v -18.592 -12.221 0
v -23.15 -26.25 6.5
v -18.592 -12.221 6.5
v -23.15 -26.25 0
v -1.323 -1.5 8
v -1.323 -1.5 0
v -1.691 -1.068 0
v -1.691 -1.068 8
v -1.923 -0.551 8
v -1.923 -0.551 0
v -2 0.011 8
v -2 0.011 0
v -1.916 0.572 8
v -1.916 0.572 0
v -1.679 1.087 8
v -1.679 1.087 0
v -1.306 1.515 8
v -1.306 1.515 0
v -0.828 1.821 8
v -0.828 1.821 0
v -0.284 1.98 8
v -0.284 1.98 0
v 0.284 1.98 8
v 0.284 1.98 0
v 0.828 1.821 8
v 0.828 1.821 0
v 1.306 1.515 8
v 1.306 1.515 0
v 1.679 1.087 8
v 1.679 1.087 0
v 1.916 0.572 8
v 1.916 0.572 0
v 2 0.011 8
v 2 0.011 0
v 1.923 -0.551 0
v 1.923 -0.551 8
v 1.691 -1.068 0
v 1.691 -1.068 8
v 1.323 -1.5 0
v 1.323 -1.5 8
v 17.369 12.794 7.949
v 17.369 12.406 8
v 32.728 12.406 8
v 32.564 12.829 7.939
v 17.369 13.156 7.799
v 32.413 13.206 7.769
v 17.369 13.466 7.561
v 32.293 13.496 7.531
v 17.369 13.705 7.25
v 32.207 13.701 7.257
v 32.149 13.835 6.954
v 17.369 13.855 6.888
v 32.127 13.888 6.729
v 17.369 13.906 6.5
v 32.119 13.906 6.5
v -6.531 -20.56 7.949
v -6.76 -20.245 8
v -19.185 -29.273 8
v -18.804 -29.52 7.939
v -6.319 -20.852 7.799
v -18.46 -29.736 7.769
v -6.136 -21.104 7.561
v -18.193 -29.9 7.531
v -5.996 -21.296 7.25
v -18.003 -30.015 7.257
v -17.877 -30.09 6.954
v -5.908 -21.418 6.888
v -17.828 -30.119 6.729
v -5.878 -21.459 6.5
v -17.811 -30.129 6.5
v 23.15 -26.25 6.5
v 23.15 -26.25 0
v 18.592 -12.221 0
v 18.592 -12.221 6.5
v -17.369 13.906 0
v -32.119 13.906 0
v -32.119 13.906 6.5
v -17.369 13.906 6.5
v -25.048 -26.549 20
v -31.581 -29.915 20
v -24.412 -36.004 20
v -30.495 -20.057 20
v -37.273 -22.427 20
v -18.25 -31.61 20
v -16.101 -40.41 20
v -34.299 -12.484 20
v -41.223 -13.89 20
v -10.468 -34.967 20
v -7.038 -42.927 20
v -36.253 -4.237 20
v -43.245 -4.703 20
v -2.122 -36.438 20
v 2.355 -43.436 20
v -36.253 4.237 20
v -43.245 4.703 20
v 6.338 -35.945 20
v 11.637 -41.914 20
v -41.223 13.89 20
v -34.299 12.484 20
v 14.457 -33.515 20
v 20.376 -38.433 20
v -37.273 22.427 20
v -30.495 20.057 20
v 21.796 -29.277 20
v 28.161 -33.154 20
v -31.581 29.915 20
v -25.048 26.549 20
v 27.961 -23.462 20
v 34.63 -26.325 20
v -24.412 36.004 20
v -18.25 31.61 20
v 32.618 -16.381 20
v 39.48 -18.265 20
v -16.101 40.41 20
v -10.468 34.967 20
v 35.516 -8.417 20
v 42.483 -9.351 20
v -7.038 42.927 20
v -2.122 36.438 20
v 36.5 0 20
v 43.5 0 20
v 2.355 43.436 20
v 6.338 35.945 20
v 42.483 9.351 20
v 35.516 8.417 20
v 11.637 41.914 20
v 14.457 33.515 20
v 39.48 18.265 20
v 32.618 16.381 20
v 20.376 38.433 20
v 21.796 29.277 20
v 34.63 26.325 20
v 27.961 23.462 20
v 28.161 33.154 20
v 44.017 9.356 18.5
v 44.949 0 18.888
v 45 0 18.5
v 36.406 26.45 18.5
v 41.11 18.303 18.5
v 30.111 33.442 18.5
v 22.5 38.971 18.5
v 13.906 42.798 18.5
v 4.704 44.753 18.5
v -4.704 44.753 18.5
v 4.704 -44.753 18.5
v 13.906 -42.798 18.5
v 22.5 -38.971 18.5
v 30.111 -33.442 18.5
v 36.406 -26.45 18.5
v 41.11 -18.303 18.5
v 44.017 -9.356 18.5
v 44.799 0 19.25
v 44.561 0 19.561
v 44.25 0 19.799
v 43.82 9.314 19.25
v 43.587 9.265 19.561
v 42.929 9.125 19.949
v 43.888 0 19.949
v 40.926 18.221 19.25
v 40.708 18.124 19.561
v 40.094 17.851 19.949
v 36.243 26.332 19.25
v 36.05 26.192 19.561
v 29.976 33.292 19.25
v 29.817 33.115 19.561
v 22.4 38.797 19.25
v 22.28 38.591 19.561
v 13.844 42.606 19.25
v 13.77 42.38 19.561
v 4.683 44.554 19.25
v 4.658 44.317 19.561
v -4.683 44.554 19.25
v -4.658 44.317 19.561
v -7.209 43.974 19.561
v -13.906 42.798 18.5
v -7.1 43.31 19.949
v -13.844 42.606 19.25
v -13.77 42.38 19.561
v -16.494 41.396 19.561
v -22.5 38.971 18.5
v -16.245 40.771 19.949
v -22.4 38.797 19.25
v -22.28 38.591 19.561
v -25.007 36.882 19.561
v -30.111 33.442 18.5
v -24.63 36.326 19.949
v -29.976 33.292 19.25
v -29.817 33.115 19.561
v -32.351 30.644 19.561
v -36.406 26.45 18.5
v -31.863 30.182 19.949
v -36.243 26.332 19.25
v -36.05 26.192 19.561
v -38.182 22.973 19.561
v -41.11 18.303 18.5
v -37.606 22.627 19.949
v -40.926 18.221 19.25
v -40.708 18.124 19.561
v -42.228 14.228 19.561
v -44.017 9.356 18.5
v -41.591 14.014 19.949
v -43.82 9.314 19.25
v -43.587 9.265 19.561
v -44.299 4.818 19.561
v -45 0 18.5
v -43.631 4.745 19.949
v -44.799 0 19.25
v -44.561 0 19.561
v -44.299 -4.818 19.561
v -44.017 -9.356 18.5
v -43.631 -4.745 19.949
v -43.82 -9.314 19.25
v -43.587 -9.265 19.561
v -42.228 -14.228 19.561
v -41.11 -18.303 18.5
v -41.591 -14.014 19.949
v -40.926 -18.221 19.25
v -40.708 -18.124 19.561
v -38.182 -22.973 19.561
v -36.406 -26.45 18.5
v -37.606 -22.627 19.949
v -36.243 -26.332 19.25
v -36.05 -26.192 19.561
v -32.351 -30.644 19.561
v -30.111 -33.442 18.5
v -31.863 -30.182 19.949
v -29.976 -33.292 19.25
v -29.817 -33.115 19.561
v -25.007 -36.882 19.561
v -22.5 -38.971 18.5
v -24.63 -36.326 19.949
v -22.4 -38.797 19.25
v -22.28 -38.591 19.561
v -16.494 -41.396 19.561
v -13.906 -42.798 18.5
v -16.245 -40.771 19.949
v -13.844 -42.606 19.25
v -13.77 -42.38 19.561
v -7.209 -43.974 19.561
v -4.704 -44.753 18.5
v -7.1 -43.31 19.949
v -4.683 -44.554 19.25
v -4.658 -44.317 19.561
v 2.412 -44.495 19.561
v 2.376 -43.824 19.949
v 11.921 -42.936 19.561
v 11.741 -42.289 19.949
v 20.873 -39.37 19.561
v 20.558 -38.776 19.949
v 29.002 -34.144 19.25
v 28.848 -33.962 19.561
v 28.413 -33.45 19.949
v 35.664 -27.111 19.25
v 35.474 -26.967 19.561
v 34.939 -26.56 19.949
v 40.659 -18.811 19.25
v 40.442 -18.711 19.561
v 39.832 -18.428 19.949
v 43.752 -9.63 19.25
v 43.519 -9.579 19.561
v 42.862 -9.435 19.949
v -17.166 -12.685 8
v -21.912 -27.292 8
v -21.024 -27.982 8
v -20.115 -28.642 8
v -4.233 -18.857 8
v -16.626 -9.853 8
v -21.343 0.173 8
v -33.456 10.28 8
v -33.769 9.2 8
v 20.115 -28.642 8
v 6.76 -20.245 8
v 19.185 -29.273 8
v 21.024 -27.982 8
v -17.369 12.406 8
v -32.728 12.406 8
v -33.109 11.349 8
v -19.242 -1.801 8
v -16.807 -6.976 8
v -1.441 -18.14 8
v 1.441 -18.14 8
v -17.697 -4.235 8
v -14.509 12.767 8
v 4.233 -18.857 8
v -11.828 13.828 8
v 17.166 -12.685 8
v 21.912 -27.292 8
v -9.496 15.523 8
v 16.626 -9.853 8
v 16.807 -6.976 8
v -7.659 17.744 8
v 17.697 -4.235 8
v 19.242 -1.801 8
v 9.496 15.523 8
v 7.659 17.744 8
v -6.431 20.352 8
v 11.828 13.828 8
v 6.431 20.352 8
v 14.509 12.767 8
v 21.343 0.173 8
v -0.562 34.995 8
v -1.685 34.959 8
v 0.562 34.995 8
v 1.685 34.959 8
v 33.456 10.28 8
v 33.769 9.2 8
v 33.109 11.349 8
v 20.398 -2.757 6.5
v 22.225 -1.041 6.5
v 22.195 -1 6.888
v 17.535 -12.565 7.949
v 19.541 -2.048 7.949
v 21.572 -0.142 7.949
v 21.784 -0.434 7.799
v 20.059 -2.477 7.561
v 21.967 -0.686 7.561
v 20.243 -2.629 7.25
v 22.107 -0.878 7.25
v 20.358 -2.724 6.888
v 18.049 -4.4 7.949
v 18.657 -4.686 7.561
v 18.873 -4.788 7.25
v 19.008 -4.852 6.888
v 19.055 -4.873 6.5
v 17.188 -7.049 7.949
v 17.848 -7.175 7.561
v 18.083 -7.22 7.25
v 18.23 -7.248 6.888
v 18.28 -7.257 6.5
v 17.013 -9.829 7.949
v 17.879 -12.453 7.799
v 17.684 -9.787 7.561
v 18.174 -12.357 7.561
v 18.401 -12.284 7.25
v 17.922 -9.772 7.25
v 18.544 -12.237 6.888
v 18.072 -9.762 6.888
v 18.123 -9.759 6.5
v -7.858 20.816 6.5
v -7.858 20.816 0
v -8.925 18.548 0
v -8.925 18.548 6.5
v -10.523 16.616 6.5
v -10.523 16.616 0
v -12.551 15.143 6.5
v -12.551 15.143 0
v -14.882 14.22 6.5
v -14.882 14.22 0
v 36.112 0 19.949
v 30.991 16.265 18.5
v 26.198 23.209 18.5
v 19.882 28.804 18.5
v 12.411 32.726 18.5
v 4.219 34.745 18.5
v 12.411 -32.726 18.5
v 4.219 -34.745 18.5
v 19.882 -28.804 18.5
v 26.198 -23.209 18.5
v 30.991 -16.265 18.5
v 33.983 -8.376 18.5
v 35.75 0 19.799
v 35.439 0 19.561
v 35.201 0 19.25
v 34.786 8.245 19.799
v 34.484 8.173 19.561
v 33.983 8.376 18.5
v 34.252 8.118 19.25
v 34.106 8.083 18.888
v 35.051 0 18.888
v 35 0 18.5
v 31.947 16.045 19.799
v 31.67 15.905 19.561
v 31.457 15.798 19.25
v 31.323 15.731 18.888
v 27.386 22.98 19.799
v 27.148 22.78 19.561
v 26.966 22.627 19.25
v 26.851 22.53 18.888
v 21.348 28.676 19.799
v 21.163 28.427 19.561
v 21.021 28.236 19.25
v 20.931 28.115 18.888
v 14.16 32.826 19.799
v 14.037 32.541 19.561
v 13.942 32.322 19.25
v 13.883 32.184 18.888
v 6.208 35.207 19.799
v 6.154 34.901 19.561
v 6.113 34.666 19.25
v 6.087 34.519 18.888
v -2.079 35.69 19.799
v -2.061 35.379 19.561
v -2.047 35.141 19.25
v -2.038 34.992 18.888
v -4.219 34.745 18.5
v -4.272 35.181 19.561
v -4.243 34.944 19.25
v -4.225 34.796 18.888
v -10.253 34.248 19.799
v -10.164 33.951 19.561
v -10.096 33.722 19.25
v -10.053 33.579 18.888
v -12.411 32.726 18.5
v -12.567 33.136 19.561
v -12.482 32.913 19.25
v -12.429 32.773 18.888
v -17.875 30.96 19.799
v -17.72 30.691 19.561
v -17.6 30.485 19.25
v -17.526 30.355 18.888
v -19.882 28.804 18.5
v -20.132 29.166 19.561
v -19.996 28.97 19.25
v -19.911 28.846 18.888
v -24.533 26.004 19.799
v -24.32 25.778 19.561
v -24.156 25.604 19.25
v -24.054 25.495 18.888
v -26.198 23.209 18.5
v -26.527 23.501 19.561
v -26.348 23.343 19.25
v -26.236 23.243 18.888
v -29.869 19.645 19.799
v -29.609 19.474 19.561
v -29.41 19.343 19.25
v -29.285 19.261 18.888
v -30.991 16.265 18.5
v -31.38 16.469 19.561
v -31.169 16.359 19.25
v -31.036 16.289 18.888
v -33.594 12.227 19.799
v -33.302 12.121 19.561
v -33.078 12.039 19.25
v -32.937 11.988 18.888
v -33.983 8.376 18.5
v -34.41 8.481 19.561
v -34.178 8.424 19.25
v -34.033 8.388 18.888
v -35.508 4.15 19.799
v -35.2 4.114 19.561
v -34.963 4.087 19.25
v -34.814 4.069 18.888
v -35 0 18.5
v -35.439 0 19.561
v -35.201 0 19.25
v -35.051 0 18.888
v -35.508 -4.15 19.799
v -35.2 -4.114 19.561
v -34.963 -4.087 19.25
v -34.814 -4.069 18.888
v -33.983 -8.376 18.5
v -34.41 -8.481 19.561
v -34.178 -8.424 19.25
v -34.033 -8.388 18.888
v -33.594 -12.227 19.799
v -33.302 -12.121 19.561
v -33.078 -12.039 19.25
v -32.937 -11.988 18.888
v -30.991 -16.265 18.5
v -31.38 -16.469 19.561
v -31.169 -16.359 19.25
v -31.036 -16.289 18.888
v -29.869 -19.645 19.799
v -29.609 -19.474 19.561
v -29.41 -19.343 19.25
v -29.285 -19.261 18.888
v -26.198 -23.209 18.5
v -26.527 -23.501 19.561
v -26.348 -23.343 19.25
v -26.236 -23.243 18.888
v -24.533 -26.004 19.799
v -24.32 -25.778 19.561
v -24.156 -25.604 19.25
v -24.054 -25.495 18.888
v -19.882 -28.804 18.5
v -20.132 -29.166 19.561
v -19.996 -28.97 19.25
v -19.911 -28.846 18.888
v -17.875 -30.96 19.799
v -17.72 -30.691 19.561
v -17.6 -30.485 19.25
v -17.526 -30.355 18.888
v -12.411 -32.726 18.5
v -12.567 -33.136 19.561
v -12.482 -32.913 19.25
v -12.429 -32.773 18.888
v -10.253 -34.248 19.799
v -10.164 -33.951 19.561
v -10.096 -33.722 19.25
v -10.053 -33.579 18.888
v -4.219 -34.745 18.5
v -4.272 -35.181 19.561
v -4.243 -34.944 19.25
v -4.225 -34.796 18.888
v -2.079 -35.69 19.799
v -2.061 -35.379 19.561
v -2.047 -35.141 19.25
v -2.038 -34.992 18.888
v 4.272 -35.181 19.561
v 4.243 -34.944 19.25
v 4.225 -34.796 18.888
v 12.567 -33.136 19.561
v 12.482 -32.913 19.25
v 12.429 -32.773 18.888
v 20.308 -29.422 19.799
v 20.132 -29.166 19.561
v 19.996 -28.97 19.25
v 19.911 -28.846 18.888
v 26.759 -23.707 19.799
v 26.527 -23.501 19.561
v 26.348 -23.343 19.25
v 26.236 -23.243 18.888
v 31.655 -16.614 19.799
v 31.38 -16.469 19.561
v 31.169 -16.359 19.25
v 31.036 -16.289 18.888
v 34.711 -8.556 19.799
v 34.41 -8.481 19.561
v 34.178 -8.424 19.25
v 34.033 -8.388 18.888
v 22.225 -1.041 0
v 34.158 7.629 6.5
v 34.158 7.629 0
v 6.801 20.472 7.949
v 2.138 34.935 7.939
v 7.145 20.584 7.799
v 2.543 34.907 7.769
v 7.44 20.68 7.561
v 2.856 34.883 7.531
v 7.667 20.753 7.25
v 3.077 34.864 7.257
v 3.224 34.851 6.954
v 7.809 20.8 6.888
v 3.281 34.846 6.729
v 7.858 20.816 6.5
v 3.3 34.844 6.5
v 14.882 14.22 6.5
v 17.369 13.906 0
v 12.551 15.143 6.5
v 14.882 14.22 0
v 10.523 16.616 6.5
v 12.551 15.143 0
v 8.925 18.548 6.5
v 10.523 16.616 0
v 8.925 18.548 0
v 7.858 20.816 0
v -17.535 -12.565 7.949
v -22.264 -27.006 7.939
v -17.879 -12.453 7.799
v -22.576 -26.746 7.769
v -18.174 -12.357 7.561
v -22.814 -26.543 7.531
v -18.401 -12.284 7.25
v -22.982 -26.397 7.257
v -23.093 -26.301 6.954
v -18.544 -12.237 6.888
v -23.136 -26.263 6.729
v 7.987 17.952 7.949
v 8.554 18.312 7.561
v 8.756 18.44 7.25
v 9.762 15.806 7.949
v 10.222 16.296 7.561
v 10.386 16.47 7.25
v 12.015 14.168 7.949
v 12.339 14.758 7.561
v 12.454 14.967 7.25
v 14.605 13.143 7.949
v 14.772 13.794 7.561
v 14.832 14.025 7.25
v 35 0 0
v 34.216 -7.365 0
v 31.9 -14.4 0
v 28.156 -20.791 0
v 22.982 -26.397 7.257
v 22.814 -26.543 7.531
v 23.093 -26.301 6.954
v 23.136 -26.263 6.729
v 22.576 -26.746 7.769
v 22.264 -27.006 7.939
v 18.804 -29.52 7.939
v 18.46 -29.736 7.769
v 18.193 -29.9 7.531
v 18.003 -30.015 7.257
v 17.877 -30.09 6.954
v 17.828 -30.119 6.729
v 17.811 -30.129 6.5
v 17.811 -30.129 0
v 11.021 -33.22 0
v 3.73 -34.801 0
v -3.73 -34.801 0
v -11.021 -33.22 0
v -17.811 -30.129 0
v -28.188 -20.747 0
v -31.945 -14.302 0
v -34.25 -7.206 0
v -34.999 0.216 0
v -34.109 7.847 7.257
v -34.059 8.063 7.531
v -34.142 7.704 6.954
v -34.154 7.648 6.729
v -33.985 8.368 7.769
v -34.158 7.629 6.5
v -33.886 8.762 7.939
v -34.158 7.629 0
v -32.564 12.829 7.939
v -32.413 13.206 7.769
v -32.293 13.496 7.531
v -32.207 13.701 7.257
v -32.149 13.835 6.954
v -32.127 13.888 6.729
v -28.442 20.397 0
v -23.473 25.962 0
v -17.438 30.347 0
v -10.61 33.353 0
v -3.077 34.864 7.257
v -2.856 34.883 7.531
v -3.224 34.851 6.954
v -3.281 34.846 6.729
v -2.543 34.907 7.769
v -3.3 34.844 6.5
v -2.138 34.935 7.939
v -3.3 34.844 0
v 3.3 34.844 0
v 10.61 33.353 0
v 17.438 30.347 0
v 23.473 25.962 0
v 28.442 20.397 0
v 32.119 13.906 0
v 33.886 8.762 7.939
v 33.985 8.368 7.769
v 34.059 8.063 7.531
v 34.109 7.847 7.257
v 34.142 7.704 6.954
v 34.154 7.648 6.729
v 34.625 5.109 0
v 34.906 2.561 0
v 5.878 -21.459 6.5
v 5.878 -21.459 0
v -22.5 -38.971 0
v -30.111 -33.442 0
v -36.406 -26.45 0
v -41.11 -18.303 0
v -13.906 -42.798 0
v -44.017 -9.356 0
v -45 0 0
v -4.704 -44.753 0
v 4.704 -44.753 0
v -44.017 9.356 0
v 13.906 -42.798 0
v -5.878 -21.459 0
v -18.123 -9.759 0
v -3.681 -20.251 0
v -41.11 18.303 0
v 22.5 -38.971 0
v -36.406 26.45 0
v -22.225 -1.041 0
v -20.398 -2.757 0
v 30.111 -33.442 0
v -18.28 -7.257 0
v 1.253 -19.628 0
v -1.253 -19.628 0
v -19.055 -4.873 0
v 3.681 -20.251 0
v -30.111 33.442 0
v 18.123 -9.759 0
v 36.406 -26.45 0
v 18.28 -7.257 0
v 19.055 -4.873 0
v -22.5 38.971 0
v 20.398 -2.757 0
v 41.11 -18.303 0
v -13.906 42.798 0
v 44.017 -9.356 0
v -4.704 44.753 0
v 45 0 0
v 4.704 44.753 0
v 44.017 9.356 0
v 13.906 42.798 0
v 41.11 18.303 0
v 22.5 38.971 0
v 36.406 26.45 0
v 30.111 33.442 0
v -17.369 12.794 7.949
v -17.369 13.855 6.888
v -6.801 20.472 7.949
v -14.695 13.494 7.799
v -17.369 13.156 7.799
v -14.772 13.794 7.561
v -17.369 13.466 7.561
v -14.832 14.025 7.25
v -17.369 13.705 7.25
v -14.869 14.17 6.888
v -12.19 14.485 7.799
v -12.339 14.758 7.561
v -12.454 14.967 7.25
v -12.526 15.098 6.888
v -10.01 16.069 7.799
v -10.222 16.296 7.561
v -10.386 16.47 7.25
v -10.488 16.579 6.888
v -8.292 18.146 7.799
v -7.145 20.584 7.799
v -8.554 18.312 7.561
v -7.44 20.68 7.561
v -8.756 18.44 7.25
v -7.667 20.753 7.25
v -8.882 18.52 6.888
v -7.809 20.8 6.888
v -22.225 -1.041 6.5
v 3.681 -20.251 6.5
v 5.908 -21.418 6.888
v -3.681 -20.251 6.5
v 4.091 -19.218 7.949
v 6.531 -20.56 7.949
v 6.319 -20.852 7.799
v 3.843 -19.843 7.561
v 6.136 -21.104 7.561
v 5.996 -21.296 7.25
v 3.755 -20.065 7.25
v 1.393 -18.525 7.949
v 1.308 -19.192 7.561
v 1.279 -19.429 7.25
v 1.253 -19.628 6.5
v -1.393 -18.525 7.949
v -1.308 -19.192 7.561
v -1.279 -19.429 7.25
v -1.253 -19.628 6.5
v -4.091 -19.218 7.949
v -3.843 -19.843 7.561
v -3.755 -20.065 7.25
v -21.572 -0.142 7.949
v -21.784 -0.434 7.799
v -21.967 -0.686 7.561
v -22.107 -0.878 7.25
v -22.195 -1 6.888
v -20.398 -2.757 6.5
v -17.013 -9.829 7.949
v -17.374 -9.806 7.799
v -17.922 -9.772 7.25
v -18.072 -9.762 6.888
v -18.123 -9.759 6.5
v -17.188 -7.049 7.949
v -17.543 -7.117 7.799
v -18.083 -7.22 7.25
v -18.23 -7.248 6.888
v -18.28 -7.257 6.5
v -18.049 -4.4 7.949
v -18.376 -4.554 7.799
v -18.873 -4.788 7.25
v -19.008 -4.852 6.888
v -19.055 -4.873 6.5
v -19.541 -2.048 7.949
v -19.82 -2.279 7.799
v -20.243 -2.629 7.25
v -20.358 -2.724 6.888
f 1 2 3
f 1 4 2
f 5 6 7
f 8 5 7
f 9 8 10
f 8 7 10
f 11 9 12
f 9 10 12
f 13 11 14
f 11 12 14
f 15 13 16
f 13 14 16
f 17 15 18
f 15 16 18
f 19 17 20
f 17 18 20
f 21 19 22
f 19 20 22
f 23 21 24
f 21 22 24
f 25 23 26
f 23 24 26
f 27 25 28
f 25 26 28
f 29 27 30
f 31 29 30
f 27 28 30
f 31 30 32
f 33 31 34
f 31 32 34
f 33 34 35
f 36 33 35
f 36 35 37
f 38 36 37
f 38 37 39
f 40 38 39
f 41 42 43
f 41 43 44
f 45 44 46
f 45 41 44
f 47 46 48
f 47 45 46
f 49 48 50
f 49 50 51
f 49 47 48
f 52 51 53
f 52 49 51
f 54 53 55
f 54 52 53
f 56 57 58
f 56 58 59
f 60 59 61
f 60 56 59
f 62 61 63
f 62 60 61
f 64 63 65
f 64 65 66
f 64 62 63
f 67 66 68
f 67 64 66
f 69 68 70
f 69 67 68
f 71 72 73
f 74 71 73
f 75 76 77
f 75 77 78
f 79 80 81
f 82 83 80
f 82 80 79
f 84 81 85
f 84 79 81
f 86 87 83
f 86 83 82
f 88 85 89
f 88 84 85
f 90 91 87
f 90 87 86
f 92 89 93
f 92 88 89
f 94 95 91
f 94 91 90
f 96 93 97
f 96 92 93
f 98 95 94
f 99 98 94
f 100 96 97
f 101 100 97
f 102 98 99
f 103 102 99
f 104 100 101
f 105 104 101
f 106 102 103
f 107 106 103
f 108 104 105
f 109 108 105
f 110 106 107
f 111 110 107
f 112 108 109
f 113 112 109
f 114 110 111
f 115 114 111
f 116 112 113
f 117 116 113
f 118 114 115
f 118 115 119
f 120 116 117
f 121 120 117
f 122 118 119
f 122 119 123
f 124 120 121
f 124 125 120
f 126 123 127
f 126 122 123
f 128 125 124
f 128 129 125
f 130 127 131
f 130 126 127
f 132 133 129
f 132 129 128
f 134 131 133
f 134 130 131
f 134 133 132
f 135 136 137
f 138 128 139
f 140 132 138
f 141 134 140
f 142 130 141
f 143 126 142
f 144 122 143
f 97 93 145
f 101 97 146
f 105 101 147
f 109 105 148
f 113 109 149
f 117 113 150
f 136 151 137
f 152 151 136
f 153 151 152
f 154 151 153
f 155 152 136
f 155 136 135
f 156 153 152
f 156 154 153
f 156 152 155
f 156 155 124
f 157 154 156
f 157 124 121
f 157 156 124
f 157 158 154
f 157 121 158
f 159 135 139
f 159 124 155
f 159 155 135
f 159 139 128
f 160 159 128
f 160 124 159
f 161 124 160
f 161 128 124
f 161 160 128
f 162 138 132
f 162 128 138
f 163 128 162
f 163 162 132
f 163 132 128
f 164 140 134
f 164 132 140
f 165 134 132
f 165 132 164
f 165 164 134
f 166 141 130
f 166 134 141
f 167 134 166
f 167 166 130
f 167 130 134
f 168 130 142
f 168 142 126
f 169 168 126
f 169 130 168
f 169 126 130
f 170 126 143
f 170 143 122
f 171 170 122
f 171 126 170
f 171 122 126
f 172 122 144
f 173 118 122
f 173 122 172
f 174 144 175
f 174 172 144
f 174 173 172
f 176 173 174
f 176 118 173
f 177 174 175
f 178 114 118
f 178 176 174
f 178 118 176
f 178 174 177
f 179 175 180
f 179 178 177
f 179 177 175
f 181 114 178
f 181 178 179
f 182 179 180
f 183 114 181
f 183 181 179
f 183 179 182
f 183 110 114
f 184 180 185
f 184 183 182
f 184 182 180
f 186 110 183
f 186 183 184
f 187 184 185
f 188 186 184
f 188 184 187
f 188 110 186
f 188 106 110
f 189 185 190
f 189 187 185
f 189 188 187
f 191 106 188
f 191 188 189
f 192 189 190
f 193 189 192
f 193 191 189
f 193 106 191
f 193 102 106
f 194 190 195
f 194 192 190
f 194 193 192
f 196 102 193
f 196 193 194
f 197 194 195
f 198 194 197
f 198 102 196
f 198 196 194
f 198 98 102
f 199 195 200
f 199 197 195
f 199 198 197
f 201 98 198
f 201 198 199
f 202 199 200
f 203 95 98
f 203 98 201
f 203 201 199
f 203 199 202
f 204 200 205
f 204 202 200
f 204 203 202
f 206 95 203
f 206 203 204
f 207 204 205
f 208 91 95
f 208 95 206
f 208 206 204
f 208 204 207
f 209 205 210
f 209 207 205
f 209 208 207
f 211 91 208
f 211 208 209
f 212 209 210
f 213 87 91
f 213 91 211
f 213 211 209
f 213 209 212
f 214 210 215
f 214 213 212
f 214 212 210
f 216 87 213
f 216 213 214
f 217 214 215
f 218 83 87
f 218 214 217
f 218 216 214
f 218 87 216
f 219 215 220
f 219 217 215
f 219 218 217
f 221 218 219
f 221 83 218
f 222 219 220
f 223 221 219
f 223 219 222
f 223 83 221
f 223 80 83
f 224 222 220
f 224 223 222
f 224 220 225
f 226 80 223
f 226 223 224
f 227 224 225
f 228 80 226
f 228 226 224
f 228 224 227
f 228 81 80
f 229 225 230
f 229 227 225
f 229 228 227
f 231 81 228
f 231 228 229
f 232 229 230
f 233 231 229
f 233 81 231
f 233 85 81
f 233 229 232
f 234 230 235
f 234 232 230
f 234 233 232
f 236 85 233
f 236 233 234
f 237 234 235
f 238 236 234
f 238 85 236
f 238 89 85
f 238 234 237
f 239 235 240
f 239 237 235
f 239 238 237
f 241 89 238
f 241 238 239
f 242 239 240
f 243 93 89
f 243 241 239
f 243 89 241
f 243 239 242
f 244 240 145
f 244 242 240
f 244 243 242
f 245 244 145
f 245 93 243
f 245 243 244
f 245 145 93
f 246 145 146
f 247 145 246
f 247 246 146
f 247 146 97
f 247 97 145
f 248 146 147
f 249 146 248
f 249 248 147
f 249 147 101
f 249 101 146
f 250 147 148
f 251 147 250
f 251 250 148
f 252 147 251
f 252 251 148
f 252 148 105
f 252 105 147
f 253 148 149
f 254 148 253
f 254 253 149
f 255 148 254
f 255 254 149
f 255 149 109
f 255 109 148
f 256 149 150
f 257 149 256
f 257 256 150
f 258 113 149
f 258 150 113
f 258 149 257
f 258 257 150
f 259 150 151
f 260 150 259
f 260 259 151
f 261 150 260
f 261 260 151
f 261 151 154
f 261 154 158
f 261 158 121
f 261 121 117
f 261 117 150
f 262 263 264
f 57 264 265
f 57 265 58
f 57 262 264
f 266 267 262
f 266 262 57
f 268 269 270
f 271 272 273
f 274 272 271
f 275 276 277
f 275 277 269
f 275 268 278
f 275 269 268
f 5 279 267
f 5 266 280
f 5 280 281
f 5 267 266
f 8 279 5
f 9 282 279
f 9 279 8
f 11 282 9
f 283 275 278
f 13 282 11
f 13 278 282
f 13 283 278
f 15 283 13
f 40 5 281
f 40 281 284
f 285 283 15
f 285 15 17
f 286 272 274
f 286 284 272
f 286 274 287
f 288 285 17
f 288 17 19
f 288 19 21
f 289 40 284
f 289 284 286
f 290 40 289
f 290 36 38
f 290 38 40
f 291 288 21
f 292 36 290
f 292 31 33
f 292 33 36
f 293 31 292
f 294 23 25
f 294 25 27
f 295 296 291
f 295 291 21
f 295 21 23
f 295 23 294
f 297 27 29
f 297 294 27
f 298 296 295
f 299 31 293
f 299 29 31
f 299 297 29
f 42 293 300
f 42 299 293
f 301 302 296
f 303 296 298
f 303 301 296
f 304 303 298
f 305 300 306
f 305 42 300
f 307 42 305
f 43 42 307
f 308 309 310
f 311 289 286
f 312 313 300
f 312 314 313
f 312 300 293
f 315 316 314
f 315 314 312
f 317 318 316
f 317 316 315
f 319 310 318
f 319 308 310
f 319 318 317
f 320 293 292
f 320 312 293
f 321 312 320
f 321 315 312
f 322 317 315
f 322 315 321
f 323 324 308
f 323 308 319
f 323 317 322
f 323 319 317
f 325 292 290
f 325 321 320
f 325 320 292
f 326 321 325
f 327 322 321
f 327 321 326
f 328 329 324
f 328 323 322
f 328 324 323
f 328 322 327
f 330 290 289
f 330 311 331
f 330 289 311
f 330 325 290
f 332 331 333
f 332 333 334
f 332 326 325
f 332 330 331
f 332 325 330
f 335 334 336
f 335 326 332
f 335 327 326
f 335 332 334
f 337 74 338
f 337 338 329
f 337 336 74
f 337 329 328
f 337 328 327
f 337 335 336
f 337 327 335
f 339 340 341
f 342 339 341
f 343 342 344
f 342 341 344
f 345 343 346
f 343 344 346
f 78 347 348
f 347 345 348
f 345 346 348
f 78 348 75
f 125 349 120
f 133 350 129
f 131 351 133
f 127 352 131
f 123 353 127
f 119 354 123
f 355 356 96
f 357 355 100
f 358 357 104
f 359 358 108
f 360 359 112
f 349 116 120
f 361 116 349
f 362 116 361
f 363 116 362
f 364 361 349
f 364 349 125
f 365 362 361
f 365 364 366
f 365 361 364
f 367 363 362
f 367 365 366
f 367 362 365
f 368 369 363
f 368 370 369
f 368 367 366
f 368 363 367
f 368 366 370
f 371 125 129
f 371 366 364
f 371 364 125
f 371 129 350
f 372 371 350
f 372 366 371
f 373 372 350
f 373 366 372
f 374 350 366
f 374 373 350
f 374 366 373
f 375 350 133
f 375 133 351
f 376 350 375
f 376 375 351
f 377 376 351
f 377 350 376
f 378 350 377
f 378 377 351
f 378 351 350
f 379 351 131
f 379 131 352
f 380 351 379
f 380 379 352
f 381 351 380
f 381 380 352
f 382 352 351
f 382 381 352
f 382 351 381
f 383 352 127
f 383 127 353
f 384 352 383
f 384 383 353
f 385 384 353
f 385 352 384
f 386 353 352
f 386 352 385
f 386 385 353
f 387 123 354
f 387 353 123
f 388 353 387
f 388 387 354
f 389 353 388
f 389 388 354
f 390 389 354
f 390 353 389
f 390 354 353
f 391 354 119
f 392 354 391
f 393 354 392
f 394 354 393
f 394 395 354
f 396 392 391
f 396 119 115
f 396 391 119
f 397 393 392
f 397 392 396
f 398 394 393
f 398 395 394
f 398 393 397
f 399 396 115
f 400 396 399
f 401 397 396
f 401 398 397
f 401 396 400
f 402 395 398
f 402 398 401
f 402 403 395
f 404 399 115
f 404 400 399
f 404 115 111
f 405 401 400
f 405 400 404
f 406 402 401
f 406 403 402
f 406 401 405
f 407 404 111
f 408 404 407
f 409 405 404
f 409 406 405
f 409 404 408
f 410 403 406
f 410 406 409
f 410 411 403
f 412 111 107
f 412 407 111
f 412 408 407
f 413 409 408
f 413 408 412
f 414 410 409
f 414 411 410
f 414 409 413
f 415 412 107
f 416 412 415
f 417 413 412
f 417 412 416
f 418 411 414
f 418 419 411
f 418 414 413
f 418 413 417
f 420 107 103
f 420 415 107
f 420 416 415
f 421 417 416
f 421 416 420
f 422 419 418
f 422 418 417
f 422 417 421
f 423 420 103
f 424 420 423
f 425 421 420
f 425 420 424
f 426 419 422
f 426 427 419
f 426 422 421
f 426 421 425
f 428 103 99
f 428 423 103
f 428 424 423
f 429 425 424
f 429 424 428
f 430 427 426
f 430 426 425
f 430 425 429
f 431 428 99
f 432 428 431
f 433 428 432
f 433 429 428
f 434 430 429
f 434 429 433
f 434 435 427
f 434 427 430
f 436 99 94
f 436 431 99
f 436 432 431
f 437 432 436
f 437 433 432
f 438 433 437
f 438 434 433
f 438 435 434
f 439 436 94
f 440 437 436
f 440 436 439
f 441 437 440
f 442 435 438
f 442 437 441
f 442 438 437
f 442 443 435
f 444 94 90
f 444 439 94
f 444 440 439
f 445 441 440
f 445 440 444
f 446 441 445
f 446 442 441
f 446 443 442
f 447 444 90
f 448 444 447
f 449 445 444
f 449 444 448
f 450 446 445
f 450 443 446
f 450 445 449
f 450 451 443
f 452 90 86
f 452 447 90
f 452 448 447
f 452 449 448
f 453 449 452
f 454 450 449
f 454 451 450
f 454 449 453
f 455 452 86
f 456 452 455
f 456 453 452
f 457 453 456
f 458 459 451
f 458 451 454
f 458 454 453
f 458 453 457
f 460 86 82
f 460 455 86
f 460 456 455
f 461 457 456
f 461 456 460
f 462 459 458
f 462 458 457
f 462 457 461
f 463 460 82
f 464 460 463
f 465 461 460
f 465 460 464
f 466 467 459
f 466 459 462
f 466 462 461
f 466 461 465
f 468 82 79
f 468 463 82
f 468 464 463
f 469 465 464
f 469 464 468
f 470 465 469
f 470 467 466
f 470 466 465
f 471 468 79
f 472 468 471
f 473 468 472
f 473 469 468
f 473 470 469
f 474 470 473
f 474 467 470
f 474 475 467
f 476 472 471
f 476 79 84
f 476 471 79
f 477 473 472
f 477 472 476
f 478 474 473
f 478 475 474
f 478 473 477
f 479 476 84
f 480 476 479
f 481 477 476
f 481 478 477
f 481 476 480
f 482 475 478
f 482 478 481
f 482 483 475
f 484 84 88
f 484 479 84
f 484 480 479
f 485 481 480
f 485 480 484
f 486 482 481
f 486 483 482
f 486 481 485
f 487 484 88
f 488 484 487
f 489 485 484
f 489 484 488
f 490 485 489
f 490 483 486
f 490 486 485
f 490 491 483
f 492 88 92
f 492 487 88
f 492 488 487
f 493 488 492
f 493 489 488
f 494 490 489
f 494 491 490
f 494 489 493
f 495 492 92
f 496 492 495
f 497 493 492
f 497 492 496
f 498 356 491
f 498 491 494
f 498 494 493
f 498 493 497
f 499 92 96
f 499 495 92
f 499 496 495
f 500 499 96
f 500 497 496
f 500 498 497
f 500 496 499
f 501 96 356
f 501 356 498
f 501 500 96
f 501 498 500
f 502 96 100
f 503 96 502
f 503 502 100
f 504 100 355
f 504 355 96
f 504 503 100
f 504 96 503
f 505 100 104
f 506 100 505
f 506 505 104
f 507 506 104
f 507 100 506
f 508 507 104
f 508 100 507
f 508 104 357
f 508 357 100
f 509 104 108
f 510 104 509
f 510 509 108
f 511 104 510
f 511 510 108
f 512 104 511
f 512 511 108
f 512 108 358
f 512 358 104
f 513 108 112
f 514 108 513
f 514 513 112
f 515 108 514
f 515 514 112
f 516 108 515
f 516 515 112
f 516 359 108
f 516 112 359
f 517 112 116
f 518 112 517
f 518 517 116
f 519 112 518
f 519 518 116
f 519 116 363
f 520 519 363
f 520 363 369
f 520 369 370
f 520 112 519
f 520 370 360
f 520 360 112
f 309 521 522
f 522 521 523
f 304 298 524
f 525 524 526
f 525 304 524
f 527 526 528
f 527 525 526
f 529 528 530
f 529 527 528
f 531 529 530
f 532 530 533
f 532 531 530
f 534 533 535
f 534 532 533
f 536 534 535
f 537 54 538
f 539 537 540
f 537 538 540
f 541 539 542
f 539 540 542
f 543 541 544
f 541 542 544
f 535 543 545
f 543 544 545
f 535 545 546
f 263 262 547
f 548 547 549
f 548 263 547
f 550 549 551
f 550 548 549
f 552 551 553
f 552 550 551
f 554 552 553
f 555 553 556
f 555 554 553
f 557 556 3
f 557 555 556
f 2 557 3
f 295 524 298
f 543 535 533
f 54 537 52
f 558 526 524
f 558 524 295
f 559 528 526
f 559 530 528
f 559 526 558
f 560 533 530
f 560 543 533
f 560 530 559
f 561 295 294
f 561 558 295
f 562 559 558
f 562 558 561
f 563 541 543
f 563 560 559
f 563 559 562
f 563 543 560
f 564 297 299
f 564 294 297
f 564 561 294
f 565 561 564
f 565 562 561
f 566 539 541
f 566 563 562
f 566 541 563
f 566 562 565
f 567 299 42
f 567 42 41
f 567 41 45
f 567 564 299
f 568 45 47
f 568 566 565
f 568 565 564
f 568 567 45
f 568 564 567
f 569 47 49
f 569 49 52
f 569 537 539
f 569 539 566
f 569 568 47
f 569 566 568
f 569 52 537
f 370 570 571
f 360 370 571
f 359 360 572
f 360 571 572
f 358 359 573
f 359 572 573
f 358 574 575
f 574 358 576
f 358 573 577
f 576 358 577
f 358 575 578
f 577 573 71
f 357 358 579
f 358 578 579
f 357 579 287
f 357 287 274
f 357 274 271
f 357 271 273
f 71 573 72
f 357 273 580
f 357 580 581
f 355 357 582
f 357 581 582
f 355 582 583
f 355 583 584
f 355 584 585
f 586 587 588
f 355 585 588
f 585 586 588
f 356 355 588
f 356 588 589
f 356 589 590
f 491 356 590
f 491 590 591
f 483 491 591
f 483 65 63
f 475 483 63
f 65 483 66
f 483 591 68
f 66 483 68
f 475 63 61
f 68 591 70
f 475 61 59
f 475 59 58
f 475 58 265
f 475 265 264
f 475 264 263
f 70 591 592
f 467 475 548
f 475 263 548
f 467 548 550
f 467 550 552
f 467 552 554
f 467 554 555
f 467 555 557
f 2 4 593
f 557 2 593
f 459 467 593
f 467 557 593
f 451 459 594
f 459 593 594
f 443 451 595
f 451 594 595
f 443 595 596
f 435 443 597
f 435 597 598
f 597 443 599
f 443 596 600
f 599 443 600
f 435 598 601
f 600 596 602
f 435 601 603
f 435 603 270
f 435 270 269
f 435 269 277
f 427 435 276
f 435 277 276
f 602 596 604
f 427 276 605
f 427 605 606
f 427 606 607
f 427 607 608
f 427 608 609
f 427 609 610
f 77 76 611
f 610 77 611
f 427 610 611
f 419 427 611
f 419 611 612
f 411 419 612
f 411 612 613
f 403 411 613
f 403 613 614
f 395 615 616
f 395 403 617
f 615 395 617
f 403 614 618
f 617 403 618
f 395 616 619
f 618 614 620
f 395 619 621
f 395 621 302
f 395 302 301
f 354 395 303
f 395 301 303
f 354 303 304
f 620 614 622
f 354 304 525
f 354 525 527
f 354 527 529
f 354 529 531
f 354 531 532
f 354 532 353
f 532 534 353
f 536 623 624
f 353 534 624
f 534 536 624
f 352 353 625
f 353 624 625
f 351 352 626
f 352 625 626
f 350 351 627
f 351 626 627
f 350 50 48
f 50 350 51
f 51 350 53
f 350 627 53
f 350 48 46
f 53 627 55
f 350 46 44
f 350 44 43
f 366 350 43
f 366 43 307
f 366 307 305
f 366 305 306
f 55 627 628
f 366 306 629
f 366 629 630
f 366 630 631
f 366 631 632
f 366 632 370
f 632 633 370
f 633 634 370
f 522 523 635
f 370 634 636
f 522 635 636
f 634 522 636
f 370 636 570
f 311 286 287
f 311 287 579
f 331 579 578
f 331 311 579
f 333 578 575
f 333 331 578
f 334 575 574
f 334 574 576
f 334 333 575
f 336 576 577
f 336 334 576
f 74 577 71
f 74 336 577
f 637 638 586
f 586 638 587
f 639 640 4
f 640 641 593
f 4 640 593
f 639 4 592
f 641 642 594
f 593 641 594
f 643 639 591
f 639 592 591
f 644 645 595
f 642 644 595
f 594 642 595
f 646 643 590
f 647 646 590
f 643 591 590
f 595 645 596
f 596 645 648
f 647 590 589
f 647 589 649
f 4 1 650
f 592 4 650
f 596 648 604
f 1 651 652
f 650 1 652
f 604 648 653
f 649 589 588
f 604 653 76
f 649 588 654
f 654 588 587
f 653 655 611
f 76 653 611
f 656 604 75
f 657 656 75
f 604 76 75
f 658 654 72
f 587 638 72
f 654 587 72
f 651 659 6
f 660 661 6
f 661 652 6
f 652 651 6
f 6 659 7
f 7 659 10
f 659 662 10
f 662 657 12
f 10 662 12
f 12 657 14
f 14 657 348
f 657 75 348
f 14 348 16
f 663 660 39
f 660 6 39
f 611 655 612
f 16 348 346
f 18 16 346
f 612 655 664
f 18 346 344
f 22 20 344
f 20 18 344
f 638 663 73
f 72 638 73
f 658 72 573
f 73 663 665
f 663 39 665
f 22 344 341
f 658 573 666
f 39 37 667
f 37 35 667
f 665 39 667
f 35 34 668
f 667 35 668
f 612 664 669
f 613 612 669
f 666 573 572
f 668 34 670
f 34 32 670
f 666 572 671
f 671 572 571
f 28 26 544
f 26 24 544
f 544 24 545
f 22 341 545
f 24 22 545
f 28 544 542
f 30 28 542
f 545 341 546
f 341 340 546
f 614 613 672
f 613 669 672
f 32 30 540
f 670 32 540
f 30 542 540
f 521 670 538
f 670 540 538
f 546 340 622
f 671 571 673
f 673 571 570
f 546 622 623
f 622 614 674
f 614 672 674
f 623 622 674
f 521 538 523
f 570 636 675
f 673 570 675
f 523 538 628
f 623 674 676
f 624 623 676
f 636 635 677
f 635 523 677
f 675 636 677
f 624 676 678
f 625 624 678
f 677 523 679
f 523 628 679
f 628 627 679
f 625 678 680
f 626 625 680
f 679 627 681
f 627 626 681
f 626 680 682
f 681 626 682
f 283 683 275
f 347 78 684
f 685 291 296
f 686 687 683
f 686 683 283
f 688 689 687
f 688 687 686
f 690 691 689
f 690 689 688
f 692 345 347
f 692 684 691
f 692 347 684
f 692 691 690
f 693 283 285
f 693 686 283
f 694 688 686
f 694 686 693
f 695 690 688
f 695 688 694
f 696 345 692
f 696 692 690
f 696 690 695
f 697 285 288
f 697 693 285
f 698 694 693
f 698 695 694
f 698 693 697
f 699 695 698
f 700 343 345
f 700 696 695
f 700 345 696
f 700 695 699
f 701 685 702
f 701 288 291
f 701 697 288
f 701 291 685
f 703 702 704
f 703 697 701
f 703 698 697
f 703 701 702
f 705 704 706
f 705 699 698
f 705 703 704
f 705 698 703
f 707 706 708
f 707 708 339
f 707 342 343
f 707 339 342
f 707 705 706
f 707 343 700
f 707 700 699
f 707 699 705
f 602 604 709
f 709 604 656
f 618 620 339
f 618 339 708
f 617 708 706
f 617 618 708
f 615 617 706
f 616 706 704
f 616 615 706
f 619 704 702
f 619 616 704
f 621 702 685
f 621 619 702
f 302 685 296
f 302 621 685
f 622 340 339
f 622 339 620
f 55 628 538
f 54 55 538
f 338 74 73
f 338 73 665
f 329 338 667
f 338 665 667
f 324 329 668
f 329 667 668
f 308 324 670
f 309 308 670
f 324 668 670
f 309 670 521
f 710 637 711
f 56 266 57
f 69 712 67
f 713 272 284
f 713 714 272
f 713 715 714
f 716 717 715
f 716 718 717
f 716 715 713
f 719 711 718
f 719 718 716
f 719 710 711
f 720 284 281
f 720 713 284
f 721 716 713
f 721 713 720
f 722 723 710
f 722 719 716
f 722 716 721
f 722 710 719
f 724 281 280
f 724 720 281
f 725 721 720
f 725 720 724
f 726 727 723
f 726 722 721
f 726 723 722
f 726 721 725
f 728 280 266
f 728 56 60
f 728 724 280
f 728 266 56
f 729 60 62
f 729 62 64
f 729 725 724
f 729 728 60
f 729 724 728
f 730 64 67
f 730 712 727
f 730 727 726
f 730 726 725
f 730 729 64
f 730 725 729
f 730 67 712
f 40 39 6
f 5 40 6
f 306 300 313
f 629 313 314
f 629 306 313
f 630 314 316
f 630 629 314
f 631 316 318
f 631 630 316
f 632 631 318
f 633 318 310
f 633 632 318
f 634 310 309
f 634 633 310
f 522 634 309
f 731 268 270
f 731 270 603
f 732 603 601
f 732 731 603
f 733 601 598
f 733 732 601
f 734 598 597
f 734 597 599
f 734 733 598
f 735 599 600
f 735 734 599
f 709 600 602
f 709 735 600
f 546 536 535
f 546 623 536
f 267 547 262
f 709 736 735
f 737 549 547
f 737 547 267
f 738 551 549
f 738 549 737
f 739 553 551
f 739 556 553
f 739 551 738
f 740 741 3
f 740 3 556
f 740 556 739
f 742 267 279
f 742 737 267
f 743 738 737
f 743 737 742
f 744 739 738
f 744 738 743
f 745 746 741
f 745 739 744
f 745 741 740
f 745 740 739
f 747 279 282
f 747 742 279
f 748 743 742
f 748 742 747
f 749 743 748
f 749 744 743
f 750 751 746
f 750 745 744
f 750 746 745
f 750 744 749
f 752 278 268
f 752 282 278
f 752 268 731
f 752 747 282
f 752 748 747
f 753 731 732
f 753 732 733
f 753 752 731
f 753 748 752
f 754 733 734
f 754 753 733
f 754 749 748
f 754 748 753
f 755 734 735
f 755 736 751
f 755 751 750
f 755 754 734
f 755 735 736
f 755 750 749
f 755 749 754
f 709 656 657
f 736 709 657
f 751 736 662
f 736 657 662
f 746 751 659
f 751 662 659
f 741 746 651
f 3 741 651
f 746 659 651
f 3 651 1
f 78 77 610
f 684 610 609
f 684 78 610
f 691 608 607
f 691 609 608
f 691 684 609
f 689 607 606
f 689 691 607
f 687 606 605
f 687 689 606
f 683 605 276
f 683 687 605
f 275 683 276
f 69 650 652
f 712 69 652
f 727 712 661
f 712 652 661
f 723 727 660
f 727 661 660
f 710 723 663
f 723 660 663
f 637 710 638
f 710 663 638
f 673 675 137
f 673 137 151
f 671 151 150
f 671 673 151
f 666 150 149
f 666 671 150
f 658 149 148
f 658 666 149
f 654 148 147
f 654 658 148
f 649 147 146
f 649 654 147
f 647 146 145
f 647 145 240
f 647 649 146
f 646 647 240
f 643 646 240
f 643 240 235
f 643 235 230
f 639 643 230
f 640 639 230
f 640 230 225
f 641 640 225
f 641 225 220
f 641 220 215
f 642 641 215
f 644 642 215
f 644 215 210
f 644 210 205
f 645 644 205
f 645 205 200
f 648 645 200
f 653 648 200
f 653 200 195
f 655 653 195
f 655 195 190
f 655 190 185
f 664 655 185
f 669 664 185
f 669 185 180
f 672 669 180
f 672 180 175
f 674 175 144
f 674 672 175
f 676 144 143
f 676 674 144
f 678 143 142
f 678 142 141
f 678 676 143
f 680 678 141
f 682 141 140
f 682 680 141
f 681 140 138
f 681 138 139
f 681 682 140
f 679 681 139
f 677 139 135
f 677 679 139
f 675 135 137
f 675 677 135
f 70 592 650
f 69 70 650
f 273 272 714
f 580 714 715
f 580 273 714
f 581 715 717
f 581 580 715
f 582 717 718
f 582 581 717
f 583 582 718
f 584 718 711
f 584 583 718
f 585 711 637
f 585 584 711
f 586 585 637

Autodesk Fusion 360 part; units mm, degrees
sketch "Esboço1" plane through (0, 0, 0) normal (0, 0, 1) x (1, 0, 0)
  circle A0 centre (0, 0) radius 45
  circle A1 centre (0, 0) radius 2
  circle A2 centre (0, 0) radius 35
  line L0 (-7.858, 20.8156) -> (0, 45)
  line L1 (-42.7975, 13.9058) -> (-17.3686, 13.9058)
  arc A3 (-17.3686, 13.9058) -> (-7.858, 20.8156) centre (-17.3686, 23.9058) ccw
  line L2 (0, 45) -> (7.858, 20.8156)
  line L3 (42.7975, 13.9058) -> (17.3686, 13.9058)
  arc A4 (7.858, 20.8156) -> (17.3686, 13.9058) centre (17.3686, 23.9058) ccw
  line L4 (-42.7975, 13.9058) -> (-22.2251, -1.041)
  line L5 (-26.4503, -36.4058) -> (-18.5923, -12.2214)
  arc A5 (-18.5923, -12.2214) -> (-22.2251, -1.041) centre (-28.1029, -9.1312) ccw
  line L6 (22.2251, -1.041) -> (42.7975, 13.9058)
  line L7 (26.4503, -36.4058) -> (18.5923, -12.2214)
  arc A6 (22.2251, -1.041) -> (18.5923, -12.2214) centre (28.1029, -9.1312) ccw
  line L8 (5.8779, -21.459) -> (26.4503, -36.4058)
  line L9 (-26.4503, -36.4058) -> (-5.8779, -21.459)
  arc A7 (5.8779, -21.459) -> (-5.8779, -21.459) centre (0, -29.5492) ccw
  line L10 (0, -1.5) -> (-1.3229, -1.5)
  line L11 (0, -1.5) -> (1.3229, -1.5)
  dimension "d1" = 10
  dimension "d2" = 10
  dimension "d3" = 10
  dimension "d4" = 10
  dimension "d5" = 10
extrude "Extrusão1" add sketch "Esboço1" along normal blind 20 contours A0 A2 L6 L7 | A0 A2 L2 L3 | A2 L3 L6 | A2 L7 L8 | A0 A2 L8 L9 | A0 A2 L0 L1 | A2 L0 L2 | A0 A2 L4 L5 | A2 L5 L9 | A2 L1 L4
extrude "Extrusão2" add sketch "Esboço1" along normal blind 8 contours A2 L0 L1 A3 L2 L3 A4 L4 L5 A5 L6 L7 A6 L8 L9 A7 | A1 L10 L11 picked at (-0.096, -1.8264)
fillet "Arredondamento1" radius 1.5 17 edges at (-41.9547, -16.2727, 20) (-32.6315, 12.6565, 20) (-28.1917, 3.294, 8) (-18.5923, -6.041, 8) (-20.8714, -19.2356, 8) (-5.5789, 27.8298, 8) (-11.4907, 15.8156, 8) (-24.7438, 13.9058, 8) (24.7438, 13.9058, 8) (11.4907, 15.8156, 8) (5.5789, 27.8298, 8) (20.8714, -19.2356, 8) (18.5923, -6.041, 8) (28.1917, 3.294, 8) (-11.8445, -25.794, 8) (0, -19.5492, 8) (11.8445, -25.794, 8)
sketch "Esboço2" plane through (0, 0, 20) normal (0, 0, 1) x (-1, 0, 0)
  circle A0 centre (0, 0) radius 43.5
  circle A1 centre (0, 0) radius 36.5
